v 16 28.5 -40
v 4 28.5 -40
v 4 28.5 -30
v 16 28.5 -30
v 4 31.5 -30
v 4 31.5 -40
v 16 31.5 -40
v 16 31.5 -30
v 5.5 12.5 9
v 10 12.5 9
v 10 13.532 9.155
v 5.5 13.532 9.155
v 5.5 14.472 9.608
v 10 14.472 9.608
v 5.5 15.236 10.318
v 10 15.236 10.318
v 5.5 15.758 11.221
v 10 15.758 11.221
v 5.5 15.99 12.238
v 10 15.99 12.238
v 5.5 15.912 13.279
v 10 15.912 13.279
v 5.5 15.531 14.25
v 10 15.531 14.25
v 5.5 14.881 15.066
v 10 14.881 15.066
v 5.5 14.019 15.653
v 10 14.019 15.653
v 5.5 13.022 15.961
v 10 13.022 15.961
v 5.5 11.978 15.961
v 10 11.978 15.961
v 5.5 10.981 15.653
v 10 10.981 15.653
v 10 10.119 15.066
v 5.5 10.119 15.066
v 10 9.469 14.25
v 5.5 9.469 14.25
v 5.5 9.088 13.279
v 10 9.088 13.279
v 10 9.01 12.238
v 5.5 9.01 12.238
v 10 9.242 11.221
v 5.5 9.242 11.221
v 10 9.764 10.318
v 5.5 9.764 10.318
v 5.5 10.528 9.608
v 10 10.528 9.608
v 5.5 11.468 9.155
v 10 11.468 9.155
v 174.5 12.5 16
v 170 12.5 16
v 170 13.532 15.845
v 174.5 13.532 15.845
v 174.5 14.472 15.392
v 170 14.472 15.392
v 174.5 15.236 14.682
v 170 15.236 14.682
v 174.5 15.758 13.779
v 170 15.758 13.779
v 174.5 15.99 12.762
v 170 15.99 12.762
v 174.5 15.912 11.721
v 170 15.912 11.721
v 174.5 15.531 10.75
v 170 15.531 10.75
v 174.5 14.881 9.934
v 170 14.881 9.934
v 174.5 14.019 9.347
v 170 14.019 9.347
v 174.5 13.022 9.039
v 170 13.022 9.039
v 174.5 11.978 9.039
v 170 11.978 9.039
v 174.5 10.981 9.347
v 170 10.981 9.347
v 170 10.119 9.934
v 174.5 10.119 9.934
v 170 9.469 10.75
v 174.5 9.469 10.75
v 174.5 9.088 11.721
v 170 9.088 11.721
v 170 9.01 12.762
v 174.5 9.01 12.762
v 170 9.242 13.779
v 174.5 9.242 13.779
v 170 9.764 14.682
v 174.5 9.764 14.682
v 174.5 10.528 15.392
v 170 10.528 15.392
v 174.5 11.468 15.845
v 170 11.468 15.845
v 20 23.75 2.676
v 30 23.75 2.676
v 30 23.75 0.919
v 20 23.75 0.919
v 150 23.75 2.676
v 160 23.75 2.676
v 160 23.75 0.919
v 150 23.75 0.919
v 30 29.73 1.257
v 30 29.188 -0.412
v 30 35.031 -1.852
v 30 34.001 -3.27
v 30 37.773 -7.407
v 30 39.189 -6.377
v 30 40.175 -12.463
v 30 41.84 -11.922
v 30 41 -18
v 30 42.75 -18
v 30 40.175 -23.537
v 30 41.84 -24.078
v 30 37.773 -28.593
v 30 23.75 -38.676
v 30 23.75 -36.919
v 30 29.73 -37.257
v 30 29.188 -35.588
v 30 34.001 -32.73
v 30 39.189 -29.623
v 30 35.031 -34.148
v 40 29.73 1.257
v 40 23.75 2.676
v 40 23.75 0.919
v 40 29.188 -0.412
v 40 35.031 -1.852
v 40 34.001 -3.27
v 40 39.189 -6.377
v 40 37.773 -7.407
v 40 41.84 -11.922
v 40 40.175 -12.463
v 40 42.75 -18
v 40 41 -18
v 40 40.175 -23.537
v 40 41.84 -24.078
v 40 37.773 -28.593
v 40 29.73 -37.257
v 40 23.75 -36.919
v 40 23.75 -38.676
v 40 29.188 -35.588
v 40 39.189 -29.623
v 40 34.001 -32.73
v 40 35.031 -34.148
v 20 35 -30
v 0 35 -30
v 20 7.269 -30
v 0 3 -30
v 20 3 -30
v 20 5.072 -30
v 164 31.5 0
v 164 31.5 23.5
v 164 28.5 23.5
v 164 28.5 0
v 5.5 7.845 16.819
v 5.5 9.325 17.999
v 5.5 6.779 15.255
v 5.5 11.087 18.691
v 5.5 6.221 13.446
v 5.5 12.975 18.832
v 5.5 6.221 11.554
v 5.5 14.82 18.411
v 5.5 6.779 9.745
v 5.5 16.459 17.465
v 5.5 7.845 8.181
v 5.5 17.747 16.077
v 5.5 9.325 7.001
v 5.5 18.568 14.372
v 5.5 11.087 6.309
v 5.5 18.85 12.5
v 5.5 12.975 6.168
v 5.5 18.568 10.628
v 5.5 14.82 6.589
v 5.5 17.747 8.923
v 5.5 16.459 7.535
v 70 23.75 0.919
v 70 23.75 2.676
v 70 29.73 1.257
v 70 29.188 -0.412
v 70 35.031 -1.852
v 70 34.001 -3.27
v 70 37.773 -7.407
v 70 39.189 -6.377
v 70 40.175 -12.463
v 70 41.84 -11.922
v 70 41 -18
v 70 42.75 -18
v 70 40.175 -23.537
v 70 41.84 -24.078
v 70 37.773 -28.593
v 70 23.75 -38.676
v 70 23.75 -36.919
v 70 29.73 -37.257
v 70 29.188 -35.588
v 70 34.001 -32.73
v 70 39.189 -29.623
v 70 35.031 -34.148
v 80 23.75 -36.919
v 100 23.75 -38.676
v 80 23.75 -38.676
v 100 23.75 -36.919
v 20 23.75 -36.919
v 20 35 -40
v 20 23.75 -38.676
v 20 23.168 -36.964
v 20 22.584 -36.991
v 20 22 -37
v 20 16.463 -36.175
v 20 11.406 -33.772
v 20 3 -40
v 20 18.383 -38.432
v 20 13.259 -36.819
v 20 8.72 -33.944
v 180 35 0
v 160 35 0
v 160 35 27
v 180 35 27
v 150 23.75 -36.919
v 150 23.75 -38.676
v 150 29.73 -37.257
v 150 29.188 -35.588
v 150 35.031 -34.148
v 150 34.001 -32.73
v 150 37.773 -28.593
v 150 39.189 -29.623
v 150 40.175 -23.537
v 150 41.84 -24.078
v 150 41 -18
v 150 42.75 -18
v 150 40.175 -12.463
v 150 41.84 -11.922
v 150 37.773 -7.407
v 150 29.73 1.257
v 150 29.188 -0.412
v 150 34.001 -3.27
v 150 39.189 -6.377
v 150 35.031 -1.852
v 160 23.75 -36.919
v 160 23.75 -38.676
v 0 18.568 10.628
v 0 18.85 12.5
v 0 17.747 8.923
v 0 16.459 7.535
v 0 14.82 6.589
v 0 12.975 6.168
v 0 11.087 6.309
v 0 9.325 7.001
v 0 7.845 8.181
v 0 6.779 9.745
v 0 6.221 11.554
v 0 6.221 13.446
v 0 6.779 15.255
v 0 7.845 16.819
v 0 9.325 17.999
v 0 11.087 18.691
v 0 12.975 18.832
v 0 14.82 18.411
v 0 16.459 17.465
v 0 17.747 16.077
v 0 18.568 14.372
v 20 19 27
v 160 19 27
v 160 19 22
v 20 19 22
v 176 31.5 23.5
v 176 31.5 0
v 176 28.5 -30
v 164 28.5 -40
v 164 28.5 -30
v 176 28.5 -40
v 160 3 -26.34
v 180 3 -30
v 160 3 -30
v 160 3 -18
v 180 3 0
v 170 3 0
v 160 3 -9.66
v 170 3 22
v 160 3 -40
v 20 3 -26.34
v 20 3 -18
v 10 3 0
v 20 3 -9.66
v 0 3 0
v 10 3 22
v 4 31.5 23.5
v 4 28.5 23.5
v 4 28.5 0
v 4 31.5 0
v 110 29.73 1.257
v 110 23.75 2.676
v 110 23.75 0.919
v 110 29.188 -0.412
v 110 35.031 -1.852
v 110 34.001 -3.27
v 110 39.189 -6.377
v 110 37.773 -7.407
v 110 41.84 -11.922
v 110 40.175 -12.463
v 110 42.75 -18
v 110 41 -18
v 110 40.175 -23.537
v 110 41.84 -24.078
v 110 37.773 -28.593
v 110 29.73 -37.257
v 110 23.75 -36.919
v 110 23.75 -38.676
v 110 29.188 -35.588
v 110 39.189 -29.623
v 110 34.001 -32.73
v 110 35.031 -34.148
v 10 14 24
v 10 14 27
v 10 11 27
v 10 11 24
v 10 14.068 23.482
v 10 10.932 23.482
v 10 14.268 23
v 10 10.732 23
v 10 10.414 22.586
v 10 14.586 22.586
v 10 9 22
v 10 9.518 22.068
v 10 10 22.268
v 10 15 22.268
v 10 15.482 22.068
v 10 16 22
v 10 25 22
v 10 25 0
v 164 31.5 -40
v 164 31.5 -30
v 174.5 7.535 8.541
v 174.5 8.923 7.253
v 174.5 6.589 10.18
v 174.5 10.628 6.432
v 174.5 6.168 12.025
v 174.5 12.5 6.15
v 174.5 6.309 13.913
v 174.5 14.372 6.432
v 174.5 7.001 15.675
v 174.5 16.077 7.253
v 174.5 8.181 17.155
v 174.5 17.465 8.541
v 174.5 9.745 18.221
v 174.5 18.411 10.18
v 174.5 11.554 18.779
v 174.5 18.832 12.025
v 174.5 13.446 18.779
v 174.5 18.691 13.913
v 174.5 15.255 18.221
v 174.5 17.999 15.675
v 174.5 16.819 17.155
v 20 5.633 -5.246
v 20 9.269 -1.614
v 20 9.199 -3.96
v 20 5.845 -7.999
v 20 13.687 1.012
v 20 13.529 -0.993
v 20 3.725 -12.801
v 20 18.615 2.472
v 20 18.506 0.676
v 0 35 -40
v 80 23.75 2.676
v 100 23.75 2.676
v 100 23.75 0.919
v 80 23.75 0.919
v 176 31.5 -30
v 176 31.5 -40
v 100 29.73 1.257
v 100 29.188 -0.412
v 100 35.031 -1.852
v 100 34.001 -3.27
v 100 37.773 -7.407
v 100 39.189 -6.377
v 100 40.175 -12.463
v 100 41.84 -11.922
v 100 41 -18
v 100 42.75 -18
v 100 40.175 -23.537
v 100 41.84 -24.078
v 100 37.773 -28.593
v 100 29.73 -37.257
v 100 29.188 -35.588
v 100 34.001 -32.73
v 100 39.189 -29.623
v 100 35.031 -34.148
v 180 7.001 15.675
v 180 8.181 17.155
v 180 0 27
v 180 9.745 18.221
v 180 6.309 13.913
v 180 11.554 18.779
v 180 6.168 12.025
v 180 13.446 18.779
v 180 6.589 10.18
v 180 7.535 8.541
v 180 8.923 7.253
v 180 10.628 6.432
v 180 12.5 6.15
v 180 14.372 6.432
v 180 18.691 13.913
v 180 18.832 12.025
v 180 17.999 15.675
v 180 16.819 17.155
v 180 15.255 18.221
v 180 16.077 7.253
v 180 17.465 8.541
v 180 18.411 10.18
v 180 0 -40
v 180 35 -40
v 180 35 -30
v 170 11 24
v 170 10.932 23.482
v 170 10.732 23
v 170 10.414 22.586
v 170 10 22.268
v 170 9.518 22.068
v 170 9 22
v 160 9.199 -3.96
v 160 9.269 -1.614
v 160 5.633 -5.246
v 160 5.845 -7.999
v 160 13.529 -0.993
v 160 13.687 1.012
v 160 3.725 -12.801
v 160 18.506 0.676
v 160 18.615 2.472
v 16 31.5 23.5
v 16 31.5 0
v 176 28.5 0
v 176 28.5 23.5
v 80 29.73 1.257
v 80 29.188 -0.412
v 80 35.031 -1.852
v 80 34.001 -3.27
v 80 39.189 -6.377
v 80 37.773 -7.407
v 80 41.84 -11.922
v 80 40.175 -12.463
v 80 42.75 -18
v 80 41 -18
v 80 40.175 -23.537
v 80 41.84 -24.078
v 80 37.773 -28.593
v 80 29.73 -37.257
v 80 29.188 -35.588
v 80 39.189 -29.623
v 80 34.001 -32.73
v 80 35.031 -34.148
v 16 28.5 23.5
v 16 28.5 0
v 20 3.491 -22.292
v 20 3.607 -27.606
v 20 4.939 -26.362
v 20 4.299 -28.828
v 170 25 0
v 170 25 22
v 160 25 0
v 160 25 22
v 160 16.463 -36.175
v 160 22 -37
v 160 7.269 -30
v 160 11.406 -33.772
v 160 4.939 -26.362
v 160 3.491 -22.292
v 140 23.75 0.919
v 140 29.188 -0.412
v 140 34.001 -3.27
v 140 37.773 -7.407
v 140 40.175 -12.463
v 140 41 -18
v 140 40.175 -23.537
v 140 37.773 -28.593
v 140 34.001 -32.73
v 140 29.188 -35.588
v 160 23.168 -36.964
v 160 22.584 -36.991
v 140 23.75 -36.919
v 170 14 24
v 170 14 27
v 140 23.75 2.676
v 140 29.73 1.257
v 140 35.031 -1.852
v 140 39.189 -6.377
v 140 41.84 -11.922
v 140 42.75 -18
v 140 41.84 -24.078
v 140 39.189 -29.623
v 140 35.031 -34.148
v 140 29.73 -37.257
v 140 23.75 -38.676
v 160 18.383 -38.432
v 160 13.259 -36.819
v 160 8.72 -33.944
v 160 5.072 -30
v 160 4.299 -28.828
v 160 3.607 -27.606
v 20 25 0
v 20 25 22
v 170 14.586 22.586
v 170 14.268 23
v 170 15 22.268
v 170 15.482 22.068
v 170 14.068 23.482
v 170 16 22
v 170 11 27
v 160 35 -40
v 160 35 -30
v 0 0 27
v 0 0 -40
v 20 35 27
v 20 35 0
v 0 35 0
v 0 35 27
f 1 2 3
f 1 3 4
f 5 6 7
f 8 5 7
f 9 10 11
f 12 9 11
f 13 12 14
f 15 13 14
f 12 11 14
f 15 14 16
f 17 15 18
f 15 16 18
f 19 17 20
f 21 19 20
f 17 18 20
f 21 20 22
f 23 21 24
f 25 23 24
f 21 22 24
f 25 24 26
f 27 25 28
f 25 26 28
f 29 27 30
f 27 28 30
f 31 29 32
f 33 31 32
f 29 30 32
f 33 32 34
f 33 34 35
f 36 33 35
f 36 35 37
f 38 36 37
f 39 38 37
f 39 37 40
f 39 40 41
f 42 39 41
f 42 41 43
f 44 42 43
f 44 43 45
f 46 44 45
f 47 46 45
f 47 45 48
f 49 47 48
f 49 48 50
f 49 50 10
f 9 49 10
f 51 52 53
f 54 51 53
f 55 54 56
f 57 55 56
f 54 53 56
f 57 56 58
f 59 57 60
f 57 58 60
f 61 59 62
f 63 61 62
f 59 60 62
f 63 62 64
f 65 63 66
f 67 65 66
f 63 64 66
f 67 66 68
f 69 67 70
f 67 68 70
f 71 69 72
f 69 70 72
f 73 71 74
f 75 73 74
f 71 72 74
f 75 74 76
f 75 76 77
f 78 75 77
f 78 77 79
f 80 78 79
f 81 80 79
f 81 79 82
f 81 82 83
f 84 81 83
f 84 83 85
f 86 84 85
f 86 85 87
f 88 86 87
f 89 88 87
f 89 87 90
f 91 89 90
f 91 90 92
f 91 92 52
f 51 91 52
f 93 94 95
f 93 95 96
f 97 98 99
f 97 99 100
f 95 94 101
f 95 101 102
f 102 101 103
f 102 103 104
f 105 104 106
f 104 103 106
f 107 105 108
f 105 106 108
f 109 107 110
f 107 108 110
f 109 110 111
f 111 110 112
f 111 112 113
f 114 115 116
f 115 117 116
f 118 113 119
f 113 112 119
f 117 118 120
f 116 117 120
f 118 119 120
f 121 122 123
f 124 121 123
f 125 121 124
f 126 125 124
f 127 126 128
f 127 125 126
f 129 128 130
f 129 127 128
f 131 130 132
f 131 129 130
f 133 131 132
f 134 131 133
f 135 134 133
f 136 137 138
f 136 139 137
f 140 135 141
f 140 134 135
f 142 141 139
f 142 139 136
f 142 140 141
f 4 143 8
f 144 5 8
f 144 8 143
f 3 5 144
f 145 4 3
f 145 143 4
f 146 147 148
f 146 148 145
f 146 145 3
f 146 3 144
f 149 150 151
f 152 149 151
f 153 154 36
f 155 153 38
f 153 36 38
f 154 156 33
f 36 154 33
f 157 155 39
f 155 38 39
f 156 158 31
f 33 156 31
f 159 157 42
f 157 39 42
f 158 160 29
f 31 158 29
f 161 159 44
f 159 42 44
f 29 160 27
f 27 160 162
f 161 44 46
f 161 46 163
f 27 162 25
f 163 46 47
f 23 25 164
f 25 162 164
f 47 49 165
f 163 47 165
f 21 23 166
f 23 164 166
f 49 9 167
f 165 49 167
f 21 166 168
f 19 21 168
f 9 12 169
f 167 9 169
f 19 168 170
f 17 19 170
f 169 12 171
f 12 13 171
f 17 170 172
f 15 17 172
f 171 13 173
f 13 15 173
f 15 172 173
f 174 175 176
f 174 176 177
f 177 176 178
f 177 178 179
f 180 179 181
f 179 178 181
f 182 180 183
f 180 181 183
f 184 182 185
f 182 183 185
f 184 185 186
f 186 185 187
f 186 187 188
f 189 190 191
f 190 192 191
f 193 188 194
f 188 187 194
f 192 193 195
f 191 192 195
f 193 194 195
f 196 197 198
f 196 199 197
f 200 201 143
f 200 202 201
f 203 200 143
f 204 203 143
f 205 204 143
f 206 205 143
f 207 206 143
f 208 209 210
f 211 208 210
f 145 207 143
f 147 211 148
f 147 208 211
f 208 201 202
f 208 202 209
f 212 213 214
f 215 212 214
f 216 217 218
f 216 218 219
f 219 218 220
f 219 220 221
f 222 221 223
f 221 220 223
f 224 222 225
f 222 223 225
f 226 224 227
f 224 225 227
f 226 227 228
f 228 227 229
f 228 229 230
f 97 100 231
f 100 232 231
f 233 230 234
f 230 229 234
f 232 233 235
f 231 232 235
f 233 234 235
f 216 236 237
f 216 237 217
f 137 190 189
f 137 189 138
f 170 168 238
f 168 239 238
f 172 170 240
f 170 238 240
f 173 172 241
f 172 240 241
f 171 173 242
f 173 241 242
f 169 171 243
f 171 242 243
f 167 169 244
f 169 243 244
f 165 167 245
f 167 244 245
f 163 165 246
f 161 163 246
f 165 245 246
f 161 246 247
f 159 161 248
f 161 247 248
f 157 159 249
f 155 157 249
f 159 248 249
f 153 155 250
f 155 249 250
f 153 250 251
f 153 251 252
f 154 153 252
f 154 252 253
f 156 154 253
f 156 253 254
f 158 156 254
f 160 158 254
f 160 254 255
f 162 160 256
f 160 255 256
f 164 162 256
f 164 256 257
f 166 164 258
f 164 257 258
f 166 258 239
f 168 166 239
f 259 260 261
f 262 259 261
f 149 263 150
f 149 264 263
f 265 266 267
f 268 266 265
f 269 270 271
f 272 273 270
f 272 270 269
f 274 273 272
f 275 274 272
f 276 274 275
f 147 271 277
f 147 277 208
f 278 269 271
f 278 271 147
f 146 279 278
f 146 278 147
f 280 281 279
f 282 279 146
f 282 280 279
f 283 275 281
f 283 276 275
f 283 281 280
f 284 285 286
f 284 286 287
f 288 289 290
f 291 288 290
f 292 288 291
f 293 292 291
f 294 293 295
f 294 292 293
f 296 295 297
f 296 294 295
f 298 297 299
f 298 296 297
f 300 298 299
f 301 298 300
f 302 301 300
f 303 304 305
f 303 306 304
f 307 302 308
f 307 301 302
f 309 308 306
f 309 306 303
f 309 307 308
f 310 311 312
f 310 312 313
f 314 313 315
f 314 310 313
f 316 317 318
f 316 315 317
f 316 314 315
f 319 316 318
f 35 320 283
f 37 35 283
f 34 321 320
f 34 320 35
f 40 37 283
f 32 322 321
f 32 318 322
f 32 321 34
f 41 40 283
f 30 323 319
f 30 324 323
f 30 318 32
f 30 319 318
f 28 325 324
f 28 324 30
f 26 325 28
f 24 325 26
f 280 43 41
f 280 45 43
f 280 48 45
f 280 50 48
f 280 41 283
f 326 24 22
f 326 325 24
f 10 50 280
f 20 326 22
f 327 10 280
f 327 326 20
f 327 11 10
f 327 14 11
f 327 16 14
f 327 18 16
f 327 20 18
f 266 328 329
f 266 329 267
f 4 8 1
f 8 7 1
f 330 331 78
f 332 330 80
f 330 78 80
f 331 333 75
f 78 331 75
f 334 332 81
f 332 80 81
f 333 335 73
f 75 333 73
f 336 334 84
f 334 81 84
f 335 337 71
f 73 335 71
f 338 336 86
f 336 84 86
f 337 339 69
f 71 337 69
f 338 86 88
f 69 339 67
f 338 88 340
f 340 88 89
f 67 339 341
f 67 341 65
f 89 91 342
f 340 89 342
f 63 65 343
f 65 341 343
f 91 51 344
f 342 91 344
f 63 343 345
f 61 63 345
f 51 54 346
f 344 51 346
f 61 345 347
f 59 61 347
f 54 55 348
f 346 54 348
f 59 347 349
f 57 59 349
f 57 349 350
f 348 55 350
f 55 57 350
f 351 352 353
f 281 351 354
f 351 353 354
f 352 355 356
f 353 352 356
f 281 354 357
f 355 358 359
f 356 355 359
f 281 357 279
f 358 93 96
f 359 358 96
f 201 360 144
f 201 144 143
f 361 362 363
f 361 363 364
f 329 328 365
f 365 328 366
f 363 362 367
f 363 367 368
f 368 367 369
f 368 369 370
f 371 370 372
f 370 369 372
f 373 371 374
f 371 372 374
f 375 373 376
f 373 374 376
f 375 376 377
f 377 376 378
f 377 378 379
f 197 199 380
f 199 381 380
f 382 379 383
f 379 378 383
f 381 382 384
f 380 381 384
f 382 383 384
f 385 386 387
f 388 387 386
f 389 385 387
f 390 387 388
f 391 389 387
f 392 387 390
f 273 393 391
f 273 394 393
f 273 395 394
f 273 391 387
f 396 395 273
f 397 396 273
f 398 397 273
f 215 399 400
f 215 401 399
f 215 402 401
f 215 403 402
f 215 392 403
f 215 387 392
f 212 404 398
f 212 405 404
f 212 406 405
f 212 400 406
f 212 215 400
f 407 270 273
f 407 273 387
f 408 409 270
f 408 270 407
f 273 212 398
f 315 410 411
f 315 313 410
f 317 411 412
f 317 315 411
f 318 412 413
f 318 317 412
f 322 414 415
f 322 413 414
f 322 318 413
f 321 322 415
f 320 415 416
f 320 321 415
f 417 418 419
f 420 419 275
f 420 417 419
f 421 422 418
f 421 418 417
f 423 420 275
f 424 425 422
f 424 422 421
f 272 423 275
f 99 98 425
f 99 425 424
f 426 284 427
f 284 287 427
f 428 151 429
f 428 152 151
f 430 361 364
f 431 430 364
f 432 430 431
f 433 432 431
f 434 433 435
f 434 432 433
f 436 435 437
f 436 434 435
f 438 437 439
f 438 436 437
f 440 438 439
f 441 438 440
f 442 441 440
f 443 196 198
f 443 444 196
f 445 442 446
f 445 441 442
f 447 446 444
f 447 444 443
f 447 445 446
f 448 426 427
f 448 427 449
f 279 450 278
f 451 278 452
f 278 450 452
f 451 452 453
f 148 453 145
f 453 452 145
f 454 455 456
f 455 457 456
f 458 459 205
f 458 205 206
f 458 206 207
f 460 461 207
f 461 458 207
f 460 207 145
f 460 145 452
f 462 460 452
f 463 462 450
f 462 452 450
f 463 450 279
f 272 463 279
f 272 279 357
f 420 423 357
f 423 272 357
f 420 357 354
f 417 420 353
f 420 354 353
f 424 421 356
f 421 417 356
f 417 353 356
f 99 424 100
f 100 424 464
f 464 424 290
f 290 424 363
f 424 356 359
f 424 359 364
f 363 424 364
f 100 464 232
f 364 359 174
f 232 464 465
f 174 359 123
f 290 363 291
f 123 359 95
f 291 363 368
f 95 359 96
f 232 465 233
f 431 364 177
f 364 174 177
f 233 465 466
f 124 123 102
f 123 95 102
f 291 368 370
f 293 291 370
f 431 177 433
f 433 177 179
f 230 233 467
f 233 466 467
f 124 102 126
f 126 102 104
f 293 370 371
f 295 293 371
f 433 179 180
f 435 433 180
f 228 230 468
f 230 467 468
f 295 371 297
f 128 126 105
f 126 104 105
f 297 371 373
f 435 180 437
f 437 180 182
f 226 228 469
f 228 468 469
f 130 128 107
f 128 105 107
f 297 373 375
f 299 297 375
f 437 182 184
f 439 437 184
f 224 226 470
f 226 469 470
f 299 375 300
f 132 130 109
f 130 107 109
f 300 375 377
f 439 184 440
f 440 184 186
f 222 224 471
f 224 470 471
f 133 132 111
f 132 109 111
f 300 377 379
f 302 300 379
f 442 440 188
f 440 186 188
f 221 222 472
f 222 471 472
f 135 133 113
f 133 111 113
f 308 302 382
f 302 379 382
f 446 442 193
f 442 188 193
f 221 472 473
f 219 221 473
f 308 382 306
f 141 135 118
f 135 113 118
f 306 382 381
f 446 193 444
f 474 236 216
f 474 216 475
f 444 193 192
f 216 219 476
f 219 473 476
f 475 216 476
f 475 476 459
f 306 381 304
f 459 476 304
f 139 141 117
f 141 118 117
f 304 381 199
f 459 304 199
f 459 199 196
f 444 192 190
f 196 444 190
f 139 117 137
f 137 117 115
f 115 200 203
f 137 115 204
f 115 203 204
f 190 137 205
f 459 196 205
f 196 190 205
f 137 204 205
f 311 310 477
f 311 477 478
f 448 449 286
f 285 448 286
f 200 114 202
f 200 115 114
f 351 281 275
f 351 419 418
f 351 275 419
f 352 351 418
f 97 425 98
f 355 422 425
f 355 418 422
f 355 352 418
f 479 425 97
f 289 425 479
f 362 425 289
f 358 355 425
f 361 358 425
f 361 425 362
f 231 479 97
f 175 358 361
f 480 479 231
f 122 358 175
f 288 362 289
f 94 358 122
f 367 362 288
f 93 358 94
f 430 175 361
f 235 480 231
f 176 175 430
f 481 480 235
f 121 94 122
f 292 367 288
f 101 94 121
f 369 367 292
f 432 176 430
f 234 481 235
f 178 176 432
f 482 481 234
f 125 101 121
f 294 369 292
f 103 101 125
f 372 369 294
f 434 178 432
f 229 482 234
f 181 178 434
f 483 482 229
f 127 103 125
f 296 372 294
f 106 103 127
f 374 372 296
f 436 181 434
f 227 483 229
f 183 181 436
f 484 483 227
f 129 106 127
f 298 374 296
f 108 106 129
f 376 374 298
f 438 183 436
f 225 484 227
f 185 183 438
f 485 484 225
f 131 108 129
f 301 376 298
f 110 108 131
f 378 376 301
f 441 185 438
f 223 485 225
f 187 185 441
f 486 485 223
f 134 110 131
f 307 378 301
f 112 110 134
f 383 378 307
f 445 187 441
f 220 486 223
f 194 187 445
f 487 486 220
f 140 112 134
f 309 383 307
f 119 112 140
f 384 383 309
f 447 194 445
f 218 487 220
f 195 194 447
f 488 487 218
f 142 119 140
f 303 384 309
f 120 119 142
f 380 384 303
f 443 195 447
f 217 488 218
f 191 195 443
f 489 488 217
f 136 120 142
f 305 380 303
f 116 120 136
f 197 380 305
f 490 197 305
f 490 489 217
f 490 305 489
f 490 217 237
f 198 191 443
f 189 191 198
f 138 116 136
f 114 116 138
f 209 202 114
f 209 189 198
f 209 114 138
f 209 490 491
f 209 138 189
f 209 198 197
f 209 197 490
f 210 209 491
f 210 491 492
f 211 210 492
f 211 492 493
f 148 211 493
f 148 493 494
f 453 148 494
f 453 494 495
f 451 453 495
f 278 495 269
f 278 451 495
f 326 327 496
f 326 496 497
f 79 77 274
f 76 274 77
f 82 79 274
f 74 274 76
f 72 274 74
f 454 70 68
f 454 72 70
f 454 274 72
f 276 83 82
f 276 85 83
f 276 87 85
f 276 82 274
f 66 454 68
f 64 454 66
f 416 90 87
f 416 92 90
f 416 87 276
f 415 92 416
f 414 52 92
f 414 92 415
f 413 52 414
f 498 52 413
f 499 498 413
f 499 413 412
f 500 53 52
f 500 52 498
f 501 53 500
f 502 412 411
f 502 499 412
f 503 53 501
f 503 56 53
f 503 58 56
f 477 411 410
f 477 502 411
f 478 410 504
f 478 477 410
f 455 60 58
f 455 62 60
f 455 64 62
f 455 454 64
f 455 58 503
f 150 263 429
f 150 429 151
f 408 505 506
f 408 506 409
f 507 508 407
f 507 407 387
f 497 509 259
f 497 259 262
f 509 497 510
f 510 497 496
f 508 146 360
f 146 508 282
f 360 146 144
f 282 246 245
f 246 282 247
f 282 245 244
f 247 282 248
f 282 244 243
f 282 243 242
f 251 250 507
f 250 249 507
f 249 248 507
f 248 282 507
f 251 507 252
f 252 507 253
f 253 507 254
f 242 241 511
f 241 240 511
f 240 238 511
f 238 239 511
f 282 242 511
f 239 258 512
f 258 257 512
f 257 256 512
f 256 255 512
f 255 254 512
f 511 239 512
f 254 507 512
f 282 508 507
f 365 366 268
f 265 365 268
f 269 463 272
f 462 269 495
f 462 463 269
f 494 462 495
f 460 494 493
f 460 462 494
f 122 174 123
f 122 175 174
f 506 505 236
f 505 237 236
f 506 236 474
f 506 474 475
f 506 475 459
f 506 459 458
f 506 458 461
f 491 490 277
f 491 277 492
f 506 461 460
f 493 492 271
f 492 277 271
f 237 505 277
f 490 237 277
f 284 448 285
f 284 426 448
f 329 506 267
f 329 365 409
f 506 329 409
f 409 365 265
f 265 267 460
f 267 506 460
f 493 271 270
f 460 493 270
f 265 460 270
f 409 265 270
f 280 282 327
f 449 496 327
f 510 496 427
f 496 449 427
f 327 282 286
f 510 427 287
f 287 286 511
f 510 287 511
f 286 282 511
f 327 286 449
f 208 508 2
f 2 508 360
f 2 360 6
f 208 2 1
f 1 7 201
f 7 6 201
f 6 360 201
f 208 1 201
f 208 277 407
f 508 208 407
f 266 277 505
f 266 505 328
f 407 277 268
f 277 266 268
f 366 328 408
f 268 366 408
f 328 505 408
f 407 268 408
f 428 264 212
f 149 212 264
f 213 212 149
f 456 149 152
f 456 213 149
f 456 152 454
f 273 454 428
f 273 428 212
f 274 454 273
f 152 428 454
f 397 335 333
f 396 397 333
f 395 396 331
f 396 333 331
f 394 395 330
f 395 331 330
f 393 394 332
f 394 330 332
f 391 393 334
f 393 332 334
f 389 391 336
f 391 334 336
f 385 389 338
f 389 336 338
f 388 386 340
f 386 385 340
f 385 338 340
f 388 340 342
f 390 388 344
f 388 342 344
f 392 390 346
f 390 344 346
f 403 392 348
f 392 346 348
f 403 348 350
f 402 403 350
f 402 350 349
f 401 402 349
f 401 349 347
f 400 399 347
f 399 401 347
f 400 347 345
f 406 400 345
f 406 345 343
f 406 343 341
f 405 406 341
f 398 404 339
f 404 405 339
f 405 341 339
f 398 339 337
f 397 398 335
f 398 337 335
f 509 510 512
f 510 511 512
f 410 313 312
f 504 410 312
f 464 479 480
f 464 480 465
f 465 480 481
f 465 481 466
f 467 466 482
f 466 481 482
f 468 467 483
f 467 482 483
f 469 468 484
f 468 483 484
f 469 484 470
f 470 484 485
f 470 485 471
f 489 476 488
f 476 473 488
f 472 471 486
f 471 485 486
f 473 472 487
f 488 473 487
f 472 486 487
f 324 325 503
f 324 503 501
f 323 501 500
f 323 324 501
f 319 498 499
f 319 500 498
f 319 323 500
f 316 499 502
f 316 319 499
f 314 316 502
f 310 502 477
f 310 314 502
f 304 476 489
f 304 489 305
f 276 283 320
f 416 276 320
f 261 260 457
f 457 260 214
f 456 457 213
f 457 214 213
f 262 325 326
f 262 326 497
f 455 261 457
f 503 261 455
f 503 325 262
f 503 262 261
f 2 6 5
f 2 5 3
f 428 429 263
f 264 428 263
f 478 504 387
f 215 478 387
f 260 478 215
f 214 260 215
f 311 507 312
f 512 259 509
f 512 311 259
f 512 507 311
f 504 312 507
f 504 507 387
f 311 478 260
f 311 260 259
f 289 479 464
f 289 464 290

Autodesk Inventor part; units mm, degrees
ref_plane "YZ Plane" through (0, 0, 0) normal (1, 0, 0) x (0, 1, 0)
ref_plane "XZ Plane" through (0, 0, 0) normal (0, 1, 0) x (-1, 0, 0)
sketch "Sketch1" plane through (0, 0, 0) normal (1, 0, 0) x (0, 1, 0)
  line L0 (0, 0) -> (35, 0)
  line L1 (35, 0) -> (35, 27)
  line L2 (35, 27) -> (0, 27)
  line L3 (0, 27) -> (0, 0)
  line L4 (0, 27) -> (25, 27) construction
  line L5 (25, 27) -> (25, 0) construction
  line L6 (25, 0) -> (0, 0) construction
  line L7 (0, 0) -> (0, 27) construction
  circle A0 centre (12.5, 12.5) radius 6.35
  dimension "d0" = 35
  dimension "d1" = 27
  dimension "d2" = 25
  dimension "d3" = 12.7
extrude "Extrusion1" add sketch "Sketch1" along normal blind 10
sketch "Sketch2" plane through (10, 0, 0) normal (1, 0, 0) x (0, 0, -1)
  line L0 (0, 35) -> (-27, 35) projected
  line L1 (0, 0) -> (0, 35) projected
  line L2 (-27, 35) -> (0, 35)
  line L3 (0, 35) -> (0, 25)
  line L4 (0, 25) -> (-27, 25)
  line L5 (-27, 25) -> (-27, 35)
  dimension "d6" = 10
extrude "Extrusion2" add sketch "Sketch2" along normal blind 10
sketch "Sketch3" plane through (10, 0, 0) normal (1, 0, 0) x (0, 0, -1)
  point P0 (0, 0)
sketch "Sketch4" plane through (0, 0, 0) normal (0, 0, -1) x (-1, 0, 0)
  point P0 (0, 0)
sketch "Sketch5" plane through (10, 0, 0) normal (1, 0, 0) x (0, 0, -1)
  point P0 (0, 0)
sketch "Sketch6" plane through (10, 0, 0) normal (1, 0, 0) x (0, 0, -1)
  line L0 (-27, 25) -> (-27, 0) projected
  line L1 (-27, 0) -> (-22, 0)
  line L2 (-22, 0) -> (-22, 11)
  line L3 (-22, 11) -> (-27, 11)
  line L4 (-27, 11) -> (-27, 0)
  line L5 (-22, 14) -> (-27, 14)
  line L6 (-27, 14) -> (-27, 19)
  line L7 (-27, 19) -> (-22, 19)
  line L8 (-22, 19) -> (-22, 14)
  point P0 (0, 0)
  dimension "d9" = 5
  dimension "d10" = 11
  dimension "d11" = 5
extrude "Extrusion3" add sketch "Sketch6" along normal blind 150
sketch "Sketch7" plane through (10, 19, 27) normal (0, 1, 0) x (1, 0, 0)
  line L0 (-10, 0) -> (10, 0) projected
  line L1 (0, 5) -> (150, 5) projected
  line L2 (0, 0) -> (10, 0)
  line L3 (10, 0) -> (10, 5)
  line L4 (10, 5) -> (0, 5)
  line L5 (0, 5) -> (0, 0)
  point P0 (-10, 27)
  dimension "d14" = 10
extrude "Extrusion4" add sketch "Sketch7" along normal blind 7.5
sketch "Sketch8" plane through (160, 0, 0) normal (1, 0, 0) x (0, 0, -1)
  line L0 (-27, 14) -> (-22, 14) projected
  line L1 (-27, 14) -> (-22, 14)
  line L2 (-22, 25) -> (-22, 14) projected
  line L3 (-22, 14) -> (-22, 25)
  line L4 (-22, 25) -> (0, 25) projected
  line L5 (-22, 25) -> (0, 25)
  line L6 (0, 25) -> (0, 35) projected
  line L7 (0, 25) -> (0, 35)
  line L8 (0, 35) -> (-27, 35)
  line L9 (-27, 35) -> (-27, 14)
  line L10 (-22, 11) -> (-22, 0) projected
  line L11 (-27, 0) -> (-22, 0)
  line L12 (-22, 0) -> (-22, 11)
  line L13 (-22, 11) -> (-27, 11)
  line L14 (-27, 11) -> (-27, 0)
  point P0 (0, 0)
extrude "Extrusion5" add sketch "Sketch8" along normal blind 10
sketch "Sketch9" plane through (170, 0, 0) normal (1, 0, 0) x (0, 0, -1)
  line L0 (0, 35) -> (-27, 35) projected
  line L1 (-27, 35) -> (0, 35)
  line L2 (0, 35) -> (0, 0)
  line L3 (0, 0) -> (-27, 0)
  line L4 (-27, 0) -> (-27, 35)
  circle A0 centre (-12.5, 12.5) radius 6.35 projected
  circle A1 centre (-12.5, 12.5) radius 6.35
extrude "Extrusion6" add sketch "Sketch9" along normal blind 10
fillet "Fillet1" radius 2 2 edges at (90, 11, 22) (90, 14, 22)
sketch "Sketch10" plane through (20, 0, 0) normal (1, 0, 0) x (0, 0, -1)
  line L0 (0, 35) -> (-27, 35) projected
  line L1 (-13.5, 35) -> (-20.5, 35)
  line L2 (-20.5, 35) -> (-6.5, 35)
  line L3 (-20.5, 35) -> (-6.5, 35)
  line L4 (-6.5, 35) -> (-6.5, 32)
  line L5 (-6.5, 32) -> (-20.5, 32)
  line L6 (-20.5, 32) -> (-20.5, 35)
  point P0 (0, 0)
  dimension "d22" = 7
  dimension "d23" = 14
  dimension "d24" = 3
extrude "Extrusion7" add sketch "Sketch10" along normal blind 140
sketch "Sketch11" plane through (0, 35, 27) normal (0, 1, 0) x (1, 0, 0)
  point P0 (0, 27)
sketch "Sketch12" plane through (160, 25, 0) normal (0, 0, -1) x (-1, 0, 0)
  line L0 (-4, 3.5) -> (-16, 3.5)
  line L1 (-16, 3.5) -> (-16, 6.5)
  line L2 (-16, 6.5) -> (-4, 6.5)
  line L3 (-4, 6.5) -> (-4, 3.5)
  line L4 (-4, 3.5) -> (-16, 6.5) construction
  line L5 (-16, 3.5) -> (-4, 6.5) construction
  line L6 (156, 6.5) -> (144, 6.5)
  line L7 (144, 6.5) -> (144, 3.5)
  line L8 (144, 3.5) -> (156, 3.5)
  line L9 (156, 3.5) -> (156, 6.5)
  line L10 (156, 6.5) -> (144, 3.5) construction
  line L11 (144, 6.5) -> (156, 3.5) construction
  point P0 (160, -25)
  point P1 (-10, 5)
  point P2 (150, 5)
  dimension "d27" = 12
  dimension "d28" = 3
  dimension "d29" = 12
  dimension "d30" = 3
extrude "Extrusion8" cut sketch "Sketch12" against normal blind 23.5
sketch "Sketch13" plane through (0, 0, 0) normal (-1, 0, 0) x (0, 0, 1)
  circle A0 centre (12.5, 12.5) radius 6.35 construction
  circle A1 centre (12.5, 12.5) radius 20.6375 construction
  point P0 (0, 0)
  dimension "d33" = 41.275
sketch "Sketch14" plane through (170, 0, 0) normal (-1, 0, 0) x (0, 0, 1)
  circle A0 centre (12.5, 12.5) radius 6.35 projected
  circle A1 centre (12.5, 12.5) radius 6.35
  circle A2 centre (12.5, 12.5) radius 3.5
  point P0 (0, 0)
  dimension "d34" = 7
extrude "Extrusion9" add sketch "Sketch14" against normal blind 4.5
sketch "Sketch15" plane through (10, 0, 0) normal (1, 0, 0) x (0, 0, -1)
  circle A0 centre (-12.5, 12.5) radius 3.5 projected
  circle A1 centre (-12.5, 12.5) radius 6.35
  circle A2 centre (-12.5, 12.5) radius 3.5
  point P0 (0, 0)
  dimension "d37" = 7
extrude "Extrusion10" add sketch "Sketch15" against normal blind 4.5
sketch "Sketch16" plane through (0, 0, 27) normal (0, 0, 1) x (1, 0, 0)
  point P0 (0, 0)
sketch "Sketch17" plane through (0, 0, 27) normal (0, 0, 1) x (1, 0, 0)
  point P0 (0, 0)
sketch "Sketch18" plane through (0, 0, 27) normal (0, 0, 1) x (1, 0, 0)
  line L0 (0, 35) -> (0, 0) projected
  line L1 (180, 35) -> (180, 0) projected
  line L2 (0, 0) -> (180, 0)
  line L3 (180, 0) -> (180, 3)
  line L4 (180, 3) -> (0, 3)
  line L5 (0, 3) -> (0, 0)
  point P0 (0, 3)
  dimension "d40" = 3
extrude "Extrusion11" add sketch "Sketch18" against normal blind 67
sketch "Sketch19" plane through (0, 3, 27) normal (0, 1, 0) x (-1, 0, 0)
  line L0 (180, 0) -> (180, -42) construction
  point P0 (0, 0)
sketch "Sketch20" plane through (0, 3, -40) normal (0, 1, 0) x (1, 0, 0)
  circle A0 centre (90, -20) radius 19
  circle A1 centre (90, -20) radius 20
  circle A2 centre (50, -20) radius 20
  circle A3 centre (50, -20) radius 19
  circle A4 centre (130, -20) radius 20
  circle A5 centre (130, -20) radius 19
  point P0 (0, -40)
  point P1 (110, -20)
  point P2 (70, -20)
  dimension "d43" = 38
  dimension "d44" = 38
  dimension "d45" = 38
extrude "Extrusion12" add sketch "Sketch20" along normal blind 30
sketch "Sketch21" plane through (10, 3, 22) normal (0, 1, 0) x (1, 0, 0)
  line L0 (-10, 22) -> (-10, 62) projected
  line L1 (-10, 62) -> (10, 62)
  line L2 (10, 62) -> (10, 52)
  line L3 (10, 52) -> (-10, 52)
  line L4 (-10, 52) -> (-10, 62)
  line L5 (170, 62) -> (-10, 62) projected
  line L6 (170, 62) -> (150, 62)
  line L7 (150, 62) -> (150, 52)
  line L8 (150, 52) -> (170, 52)
  line L9 (170, 52) -> (170, 62)
  dimension "d48" = 10
  dimension "d49" = 10
extrude "Extrusion13" add sketch "Sketch21" along normal blind 32
sketch "Sketch22" plane through (4, 28.5, 0) normal (0, 1, 0) x (1, 0, 0)
  point P0 (-4, 0)
sketch "Sketch23" plane through (0, 0, -40) normal (0, 0, -1) x (-1, 0, 0)
  line L0 (-4, 28.5) -> (-16, 28.5) projected
  line L1 (-4, 31.5) -> (-4, 28.5) projected
  line L2 (-16, 28.5) -> (-4, 28.5)
  line L3 (-4, 28.5) -> (-4, 31.5)
  line L4 (-4, 31.5) -> (-16, 31.5)
  line L5 (-16, 31.5) -> (-16, 28.5)
  line L6 (-164, 28.5) -> (-176, 28.5) projected
  line L7 (-164, 31.5) -> (-164, 28.5) projected
  line L8 (-176, 28.5) -> (-164, 28.5)
  line L9 (-164, 28.5) -> (-164, 31.5)
  line L10 (-164, 31.5) -> (-176, 31.5)
  line L11 (-176, 31.5) -> (-176, 28.5)
  point P0 (0, 0)
extrude "Extrusion14" cut sketch "Sketch23" against normal blind 10
sketch "Sketch24" plane through (130, 33, -20) normal (0, 1, 0) x (1, 0, 0)
  line L0 (27.2959, -23.1323) -> (-103.8128, -23.1323)
  line L1 (-103.8128, -23.1323) -> (-103.8128, 25.7271)
  line L2 (-103.8128, 25.7271) -> (27.2959, 25.7271)
  line L3 (27.2959, 25.7271) -> (27.2959, -23.1323)
  point P0 (-130, -20)
extrude "Extrusion15" cut sketch "Sketch24" against normal blind 30
sketch "Sketch25" plane through (10, 3, 22) normal (0, 1, 0) x (1, 0, 0)
  circle A0 centre (80, 38.75) radius 19
  circle A1 centre (80, 38.75) radius 20.75
  circle A2 centre (121.5, 38.75) radius 20.75
  circle A3 centre (121.5, 38.75) radius 19
  circle A4 centre (38.5, 38.75) radius 20.75
  circle A5 centre (38.5, 38.75) radius 19
  point P0 (-10, 22)
  point P1 (59.25, 38.75)
  point P2 (100.75, 38.75)
  dimension "d56" = 38
  dimension "d57" = 41.5
  dimension "d58" = 38
  dimension "d59" = 38
extrude "Extrusion16" add sketch "Sketch25" along normal blind 45
sketch "Sketch26" plane through (0, 35, 27) normal (0, 1, 0) x (1, 0, 0)
  line L0 (20, 6.5) -> (160, 6.5) projected
  line L1 (20, 20.5) -> (160, 20.5) projected
  line L2 (20, 6.5) -> (160, 6.5)
  line L3 (160, 6.5) -> (160, 20.5)
  line L4 (160, 20.5) -> (20, 20.5)
  line L5 (20, 20.5) -> (20, 6.5)
  point P0 (0, 27)
extrude "Extrusion17" cut sketch "Sketch26" against normal blind 5
sketch "Sketch27" plane through (10, 48, 22) normal (0, 1, 0) x (1, 0, 0)
  line L0 (16.1578, 67.5748) -> (146.5005, 67.5748)
  line L1 (146.5005, 67.5748) -> (146.5005, 15.2049)
  line L2 (146.5005, 15.2049) -> (16.1578, 15.2049)
  line L3 (16.1578, 15.2049) -> (16.1578, 67.5748)
  point P0 (-10, 22)
extrude "Extrusion18" cut sketch "Sketch27" against normal blind 45
sketch "Sketch28" plane through (10, 3, 22) normal (0, 1, 0) x (1, 0, 0)
  point P0 (-10, 22)
sketch "Sketch29" plane through (0, 0, 0) normal (-1, 0, 0) x (0, 0, 1)
  point P0 (0, 0)
sketch "Sketch30" plane through (20, 3, -30) normal (1, 0, 0) x (0, 0, -1)
  circle A0 centre (-12, 19) radius 19
  line L0 (-30, 0) -> (0, 0) projected
  circle A1 centre (-12, 19) radius 20.75
  point P0 (-30, -3)
  point P1 (-3.6596, 0)
  point P2 (-20.3404, 0)
  point P3 (-12, 0)
  dimension "d66" = 41.5
extrude "Extrusion19" add sketch "Sketch30" along normal blind 140 contours L0 A1 picked at (-31.4706, 19.7749)
ref_plane "Work Plane1" through (20, 42.75, -18) normal (0, 1, 0) x (-1, 0, 0)
sketch "Sketch31" plane through (20, 42.75, -18) normal (0, 1, 0) x (-1, 0, 0)
  line L0 (0, -22) -> (-140, -22) projected
  line L1 (0, 20.75) -> (-140, 20.75) projected
  line L2 (-140, -22) -> (-130, -22)
  line L3 (-130, -22) -> (-130, 20.75)
  line L4 (-130, 20.75) -> (-140, 20.75)
  line L5 (-140, 20.75) -> (-140, -22)
  line L6 (-130, 20.75) -> (-120, 20.75)
  line L7 (-120, 20.75) -> (-120, -22)
  line L8 (-120, -22) -> (-130, -22)
  line L9 (-130, -22) -> (-130, 20.75)
  line L10 (-120, 20.75) -> (-110, 20.75)
  line L11 (-110, 20.75) -> (-110, -22)
  line L12 (-110, -22) -> (-120, -22)
  line L13 (-120, -22) -> (-120, 20.75)
  line L14 (-110, 20.75) -> (-100, 20.75)
  line L15 (-100, 20.75) -> (-100, -22)
  line L16 (-100, -22) -> (-110, -22)
  line L17 (-110, -22) -> (-110, 20.75)
  line L18 (-100, 20.75) -> (-90, 20.75)
  line L19 (-90, 20.75) -> (-90, -22)
  line L20 (-90, -22) -> (-100, -22)
  line L21 (-100, -22) -> (-100, 20.75)
  line L22 (-90, 20.75) -> (-80, 20.75)
  line L23 (-80, 20.75) -> (-80, -22)
  line L24 (-80, -22) -> (-90, -22)
  line L25 (-90, -22) -> (-90, 20.75)
  line L26 (-80, 20.75) -> (-70, 20.75)
  line L27 (-70, 20.75) -> (-70, -22)
  line L28 (-70, -22) -> (-80, -22)
  line L29 (-80, -22) -> (-80, 20.75)
  line L30 (-70, 20.75) -> (-60, 20.75)
  line L31 (-60, 20.75) -> (-60, -22)
  line L32 (-60, -22) -> (-70, -22)
  line L33 (-70, -22) -> (-70, 20.75)
  line L34 (-60, 20.75) -> (-50, 20.75)
  line L35 (-50, 20.75) -> (-50, -22.9756)
  line L36 (-50, -22.9756) -> (-60, -22.9756)
  line L37 (-60, -22.9756) -> (-60, 20.75)
  line L38 (-50, 20.75) -> (-40, 20.75)
  line L39 (-40, 20.75) -> (-40, -22)
  line L40 (-40, -22) -> (-50, -22)
  line L41 (-50, -22) -> (-50, 20.75)
  line L42 (-40, 20.75) -> (-30, 20.75)
  line L43 (-30, 20.75) -> (-30, -22)
  line L44 (-30, -22) -> (-40, -22)
  line L45 (-40, -22) -> (-40, 20.75)
  line L46 (-30, 20.75) -> (-20, 20.75)
  line L47 (-20, 20.75) -> (-20, -22)
  line L48 (-20, -22) -> (-30, -22)
  line L49 (-30, -22) -> (-30, 20.75)
  line L50 (-20, 20.75) -> (-10, 20.75)
  line L51 (-10, 20.75) -> (-10, -22)
  line L52 (-10, -22) -> (-20, -22)
  line L53 (-20, -22) -> (-20, 20.75)
  line L54 (-10, 20.75) -> (0, 20.75)
  line L55 (0, 20.75) -> (0, -22)
  line L56 (0, -22) -> (-10, -22)
  line L57 (-10, -22) -> (-10, 20.75)
  point P0 (20, 18)
  point P1 (-80, -22)
  point P2 (-60, -22)
  point P3 (-20, -22)
  point P4 (-10, -22)
  point P5 (-120, -22)
  point P6 (-90, -22)
  dimension "d69" = 10
  dimension "d70" = 10
  dimension "d71" = 10
  dimension "d72" = 10
  dimension "d73" = 10
  dimension "d74" = 10
  dimension "d75" = 10
  dimension "d76" = 10
  dimension "d77" = 10
  dimension "d78" = 10
  dimension "d79" = 10
  dimension "d80" = 10
  dimension "d81" = 10
extrude "Extrusion20" cut sketch "Sketch31" against normal blind 19 contours L0 L51 L1 L55 | L0 L43 L1 L47 | L0 L39 L1 L43 | L0 L35 L1 L39 | L0 L27 L1 L31 | L0 L23 L1 L27 | L0 L15 L1 L19 | L0 L11 L1 L15 | L0 L7 L1 L11 | L0 L5 L1 L3
properties part number "_3DPrint"
